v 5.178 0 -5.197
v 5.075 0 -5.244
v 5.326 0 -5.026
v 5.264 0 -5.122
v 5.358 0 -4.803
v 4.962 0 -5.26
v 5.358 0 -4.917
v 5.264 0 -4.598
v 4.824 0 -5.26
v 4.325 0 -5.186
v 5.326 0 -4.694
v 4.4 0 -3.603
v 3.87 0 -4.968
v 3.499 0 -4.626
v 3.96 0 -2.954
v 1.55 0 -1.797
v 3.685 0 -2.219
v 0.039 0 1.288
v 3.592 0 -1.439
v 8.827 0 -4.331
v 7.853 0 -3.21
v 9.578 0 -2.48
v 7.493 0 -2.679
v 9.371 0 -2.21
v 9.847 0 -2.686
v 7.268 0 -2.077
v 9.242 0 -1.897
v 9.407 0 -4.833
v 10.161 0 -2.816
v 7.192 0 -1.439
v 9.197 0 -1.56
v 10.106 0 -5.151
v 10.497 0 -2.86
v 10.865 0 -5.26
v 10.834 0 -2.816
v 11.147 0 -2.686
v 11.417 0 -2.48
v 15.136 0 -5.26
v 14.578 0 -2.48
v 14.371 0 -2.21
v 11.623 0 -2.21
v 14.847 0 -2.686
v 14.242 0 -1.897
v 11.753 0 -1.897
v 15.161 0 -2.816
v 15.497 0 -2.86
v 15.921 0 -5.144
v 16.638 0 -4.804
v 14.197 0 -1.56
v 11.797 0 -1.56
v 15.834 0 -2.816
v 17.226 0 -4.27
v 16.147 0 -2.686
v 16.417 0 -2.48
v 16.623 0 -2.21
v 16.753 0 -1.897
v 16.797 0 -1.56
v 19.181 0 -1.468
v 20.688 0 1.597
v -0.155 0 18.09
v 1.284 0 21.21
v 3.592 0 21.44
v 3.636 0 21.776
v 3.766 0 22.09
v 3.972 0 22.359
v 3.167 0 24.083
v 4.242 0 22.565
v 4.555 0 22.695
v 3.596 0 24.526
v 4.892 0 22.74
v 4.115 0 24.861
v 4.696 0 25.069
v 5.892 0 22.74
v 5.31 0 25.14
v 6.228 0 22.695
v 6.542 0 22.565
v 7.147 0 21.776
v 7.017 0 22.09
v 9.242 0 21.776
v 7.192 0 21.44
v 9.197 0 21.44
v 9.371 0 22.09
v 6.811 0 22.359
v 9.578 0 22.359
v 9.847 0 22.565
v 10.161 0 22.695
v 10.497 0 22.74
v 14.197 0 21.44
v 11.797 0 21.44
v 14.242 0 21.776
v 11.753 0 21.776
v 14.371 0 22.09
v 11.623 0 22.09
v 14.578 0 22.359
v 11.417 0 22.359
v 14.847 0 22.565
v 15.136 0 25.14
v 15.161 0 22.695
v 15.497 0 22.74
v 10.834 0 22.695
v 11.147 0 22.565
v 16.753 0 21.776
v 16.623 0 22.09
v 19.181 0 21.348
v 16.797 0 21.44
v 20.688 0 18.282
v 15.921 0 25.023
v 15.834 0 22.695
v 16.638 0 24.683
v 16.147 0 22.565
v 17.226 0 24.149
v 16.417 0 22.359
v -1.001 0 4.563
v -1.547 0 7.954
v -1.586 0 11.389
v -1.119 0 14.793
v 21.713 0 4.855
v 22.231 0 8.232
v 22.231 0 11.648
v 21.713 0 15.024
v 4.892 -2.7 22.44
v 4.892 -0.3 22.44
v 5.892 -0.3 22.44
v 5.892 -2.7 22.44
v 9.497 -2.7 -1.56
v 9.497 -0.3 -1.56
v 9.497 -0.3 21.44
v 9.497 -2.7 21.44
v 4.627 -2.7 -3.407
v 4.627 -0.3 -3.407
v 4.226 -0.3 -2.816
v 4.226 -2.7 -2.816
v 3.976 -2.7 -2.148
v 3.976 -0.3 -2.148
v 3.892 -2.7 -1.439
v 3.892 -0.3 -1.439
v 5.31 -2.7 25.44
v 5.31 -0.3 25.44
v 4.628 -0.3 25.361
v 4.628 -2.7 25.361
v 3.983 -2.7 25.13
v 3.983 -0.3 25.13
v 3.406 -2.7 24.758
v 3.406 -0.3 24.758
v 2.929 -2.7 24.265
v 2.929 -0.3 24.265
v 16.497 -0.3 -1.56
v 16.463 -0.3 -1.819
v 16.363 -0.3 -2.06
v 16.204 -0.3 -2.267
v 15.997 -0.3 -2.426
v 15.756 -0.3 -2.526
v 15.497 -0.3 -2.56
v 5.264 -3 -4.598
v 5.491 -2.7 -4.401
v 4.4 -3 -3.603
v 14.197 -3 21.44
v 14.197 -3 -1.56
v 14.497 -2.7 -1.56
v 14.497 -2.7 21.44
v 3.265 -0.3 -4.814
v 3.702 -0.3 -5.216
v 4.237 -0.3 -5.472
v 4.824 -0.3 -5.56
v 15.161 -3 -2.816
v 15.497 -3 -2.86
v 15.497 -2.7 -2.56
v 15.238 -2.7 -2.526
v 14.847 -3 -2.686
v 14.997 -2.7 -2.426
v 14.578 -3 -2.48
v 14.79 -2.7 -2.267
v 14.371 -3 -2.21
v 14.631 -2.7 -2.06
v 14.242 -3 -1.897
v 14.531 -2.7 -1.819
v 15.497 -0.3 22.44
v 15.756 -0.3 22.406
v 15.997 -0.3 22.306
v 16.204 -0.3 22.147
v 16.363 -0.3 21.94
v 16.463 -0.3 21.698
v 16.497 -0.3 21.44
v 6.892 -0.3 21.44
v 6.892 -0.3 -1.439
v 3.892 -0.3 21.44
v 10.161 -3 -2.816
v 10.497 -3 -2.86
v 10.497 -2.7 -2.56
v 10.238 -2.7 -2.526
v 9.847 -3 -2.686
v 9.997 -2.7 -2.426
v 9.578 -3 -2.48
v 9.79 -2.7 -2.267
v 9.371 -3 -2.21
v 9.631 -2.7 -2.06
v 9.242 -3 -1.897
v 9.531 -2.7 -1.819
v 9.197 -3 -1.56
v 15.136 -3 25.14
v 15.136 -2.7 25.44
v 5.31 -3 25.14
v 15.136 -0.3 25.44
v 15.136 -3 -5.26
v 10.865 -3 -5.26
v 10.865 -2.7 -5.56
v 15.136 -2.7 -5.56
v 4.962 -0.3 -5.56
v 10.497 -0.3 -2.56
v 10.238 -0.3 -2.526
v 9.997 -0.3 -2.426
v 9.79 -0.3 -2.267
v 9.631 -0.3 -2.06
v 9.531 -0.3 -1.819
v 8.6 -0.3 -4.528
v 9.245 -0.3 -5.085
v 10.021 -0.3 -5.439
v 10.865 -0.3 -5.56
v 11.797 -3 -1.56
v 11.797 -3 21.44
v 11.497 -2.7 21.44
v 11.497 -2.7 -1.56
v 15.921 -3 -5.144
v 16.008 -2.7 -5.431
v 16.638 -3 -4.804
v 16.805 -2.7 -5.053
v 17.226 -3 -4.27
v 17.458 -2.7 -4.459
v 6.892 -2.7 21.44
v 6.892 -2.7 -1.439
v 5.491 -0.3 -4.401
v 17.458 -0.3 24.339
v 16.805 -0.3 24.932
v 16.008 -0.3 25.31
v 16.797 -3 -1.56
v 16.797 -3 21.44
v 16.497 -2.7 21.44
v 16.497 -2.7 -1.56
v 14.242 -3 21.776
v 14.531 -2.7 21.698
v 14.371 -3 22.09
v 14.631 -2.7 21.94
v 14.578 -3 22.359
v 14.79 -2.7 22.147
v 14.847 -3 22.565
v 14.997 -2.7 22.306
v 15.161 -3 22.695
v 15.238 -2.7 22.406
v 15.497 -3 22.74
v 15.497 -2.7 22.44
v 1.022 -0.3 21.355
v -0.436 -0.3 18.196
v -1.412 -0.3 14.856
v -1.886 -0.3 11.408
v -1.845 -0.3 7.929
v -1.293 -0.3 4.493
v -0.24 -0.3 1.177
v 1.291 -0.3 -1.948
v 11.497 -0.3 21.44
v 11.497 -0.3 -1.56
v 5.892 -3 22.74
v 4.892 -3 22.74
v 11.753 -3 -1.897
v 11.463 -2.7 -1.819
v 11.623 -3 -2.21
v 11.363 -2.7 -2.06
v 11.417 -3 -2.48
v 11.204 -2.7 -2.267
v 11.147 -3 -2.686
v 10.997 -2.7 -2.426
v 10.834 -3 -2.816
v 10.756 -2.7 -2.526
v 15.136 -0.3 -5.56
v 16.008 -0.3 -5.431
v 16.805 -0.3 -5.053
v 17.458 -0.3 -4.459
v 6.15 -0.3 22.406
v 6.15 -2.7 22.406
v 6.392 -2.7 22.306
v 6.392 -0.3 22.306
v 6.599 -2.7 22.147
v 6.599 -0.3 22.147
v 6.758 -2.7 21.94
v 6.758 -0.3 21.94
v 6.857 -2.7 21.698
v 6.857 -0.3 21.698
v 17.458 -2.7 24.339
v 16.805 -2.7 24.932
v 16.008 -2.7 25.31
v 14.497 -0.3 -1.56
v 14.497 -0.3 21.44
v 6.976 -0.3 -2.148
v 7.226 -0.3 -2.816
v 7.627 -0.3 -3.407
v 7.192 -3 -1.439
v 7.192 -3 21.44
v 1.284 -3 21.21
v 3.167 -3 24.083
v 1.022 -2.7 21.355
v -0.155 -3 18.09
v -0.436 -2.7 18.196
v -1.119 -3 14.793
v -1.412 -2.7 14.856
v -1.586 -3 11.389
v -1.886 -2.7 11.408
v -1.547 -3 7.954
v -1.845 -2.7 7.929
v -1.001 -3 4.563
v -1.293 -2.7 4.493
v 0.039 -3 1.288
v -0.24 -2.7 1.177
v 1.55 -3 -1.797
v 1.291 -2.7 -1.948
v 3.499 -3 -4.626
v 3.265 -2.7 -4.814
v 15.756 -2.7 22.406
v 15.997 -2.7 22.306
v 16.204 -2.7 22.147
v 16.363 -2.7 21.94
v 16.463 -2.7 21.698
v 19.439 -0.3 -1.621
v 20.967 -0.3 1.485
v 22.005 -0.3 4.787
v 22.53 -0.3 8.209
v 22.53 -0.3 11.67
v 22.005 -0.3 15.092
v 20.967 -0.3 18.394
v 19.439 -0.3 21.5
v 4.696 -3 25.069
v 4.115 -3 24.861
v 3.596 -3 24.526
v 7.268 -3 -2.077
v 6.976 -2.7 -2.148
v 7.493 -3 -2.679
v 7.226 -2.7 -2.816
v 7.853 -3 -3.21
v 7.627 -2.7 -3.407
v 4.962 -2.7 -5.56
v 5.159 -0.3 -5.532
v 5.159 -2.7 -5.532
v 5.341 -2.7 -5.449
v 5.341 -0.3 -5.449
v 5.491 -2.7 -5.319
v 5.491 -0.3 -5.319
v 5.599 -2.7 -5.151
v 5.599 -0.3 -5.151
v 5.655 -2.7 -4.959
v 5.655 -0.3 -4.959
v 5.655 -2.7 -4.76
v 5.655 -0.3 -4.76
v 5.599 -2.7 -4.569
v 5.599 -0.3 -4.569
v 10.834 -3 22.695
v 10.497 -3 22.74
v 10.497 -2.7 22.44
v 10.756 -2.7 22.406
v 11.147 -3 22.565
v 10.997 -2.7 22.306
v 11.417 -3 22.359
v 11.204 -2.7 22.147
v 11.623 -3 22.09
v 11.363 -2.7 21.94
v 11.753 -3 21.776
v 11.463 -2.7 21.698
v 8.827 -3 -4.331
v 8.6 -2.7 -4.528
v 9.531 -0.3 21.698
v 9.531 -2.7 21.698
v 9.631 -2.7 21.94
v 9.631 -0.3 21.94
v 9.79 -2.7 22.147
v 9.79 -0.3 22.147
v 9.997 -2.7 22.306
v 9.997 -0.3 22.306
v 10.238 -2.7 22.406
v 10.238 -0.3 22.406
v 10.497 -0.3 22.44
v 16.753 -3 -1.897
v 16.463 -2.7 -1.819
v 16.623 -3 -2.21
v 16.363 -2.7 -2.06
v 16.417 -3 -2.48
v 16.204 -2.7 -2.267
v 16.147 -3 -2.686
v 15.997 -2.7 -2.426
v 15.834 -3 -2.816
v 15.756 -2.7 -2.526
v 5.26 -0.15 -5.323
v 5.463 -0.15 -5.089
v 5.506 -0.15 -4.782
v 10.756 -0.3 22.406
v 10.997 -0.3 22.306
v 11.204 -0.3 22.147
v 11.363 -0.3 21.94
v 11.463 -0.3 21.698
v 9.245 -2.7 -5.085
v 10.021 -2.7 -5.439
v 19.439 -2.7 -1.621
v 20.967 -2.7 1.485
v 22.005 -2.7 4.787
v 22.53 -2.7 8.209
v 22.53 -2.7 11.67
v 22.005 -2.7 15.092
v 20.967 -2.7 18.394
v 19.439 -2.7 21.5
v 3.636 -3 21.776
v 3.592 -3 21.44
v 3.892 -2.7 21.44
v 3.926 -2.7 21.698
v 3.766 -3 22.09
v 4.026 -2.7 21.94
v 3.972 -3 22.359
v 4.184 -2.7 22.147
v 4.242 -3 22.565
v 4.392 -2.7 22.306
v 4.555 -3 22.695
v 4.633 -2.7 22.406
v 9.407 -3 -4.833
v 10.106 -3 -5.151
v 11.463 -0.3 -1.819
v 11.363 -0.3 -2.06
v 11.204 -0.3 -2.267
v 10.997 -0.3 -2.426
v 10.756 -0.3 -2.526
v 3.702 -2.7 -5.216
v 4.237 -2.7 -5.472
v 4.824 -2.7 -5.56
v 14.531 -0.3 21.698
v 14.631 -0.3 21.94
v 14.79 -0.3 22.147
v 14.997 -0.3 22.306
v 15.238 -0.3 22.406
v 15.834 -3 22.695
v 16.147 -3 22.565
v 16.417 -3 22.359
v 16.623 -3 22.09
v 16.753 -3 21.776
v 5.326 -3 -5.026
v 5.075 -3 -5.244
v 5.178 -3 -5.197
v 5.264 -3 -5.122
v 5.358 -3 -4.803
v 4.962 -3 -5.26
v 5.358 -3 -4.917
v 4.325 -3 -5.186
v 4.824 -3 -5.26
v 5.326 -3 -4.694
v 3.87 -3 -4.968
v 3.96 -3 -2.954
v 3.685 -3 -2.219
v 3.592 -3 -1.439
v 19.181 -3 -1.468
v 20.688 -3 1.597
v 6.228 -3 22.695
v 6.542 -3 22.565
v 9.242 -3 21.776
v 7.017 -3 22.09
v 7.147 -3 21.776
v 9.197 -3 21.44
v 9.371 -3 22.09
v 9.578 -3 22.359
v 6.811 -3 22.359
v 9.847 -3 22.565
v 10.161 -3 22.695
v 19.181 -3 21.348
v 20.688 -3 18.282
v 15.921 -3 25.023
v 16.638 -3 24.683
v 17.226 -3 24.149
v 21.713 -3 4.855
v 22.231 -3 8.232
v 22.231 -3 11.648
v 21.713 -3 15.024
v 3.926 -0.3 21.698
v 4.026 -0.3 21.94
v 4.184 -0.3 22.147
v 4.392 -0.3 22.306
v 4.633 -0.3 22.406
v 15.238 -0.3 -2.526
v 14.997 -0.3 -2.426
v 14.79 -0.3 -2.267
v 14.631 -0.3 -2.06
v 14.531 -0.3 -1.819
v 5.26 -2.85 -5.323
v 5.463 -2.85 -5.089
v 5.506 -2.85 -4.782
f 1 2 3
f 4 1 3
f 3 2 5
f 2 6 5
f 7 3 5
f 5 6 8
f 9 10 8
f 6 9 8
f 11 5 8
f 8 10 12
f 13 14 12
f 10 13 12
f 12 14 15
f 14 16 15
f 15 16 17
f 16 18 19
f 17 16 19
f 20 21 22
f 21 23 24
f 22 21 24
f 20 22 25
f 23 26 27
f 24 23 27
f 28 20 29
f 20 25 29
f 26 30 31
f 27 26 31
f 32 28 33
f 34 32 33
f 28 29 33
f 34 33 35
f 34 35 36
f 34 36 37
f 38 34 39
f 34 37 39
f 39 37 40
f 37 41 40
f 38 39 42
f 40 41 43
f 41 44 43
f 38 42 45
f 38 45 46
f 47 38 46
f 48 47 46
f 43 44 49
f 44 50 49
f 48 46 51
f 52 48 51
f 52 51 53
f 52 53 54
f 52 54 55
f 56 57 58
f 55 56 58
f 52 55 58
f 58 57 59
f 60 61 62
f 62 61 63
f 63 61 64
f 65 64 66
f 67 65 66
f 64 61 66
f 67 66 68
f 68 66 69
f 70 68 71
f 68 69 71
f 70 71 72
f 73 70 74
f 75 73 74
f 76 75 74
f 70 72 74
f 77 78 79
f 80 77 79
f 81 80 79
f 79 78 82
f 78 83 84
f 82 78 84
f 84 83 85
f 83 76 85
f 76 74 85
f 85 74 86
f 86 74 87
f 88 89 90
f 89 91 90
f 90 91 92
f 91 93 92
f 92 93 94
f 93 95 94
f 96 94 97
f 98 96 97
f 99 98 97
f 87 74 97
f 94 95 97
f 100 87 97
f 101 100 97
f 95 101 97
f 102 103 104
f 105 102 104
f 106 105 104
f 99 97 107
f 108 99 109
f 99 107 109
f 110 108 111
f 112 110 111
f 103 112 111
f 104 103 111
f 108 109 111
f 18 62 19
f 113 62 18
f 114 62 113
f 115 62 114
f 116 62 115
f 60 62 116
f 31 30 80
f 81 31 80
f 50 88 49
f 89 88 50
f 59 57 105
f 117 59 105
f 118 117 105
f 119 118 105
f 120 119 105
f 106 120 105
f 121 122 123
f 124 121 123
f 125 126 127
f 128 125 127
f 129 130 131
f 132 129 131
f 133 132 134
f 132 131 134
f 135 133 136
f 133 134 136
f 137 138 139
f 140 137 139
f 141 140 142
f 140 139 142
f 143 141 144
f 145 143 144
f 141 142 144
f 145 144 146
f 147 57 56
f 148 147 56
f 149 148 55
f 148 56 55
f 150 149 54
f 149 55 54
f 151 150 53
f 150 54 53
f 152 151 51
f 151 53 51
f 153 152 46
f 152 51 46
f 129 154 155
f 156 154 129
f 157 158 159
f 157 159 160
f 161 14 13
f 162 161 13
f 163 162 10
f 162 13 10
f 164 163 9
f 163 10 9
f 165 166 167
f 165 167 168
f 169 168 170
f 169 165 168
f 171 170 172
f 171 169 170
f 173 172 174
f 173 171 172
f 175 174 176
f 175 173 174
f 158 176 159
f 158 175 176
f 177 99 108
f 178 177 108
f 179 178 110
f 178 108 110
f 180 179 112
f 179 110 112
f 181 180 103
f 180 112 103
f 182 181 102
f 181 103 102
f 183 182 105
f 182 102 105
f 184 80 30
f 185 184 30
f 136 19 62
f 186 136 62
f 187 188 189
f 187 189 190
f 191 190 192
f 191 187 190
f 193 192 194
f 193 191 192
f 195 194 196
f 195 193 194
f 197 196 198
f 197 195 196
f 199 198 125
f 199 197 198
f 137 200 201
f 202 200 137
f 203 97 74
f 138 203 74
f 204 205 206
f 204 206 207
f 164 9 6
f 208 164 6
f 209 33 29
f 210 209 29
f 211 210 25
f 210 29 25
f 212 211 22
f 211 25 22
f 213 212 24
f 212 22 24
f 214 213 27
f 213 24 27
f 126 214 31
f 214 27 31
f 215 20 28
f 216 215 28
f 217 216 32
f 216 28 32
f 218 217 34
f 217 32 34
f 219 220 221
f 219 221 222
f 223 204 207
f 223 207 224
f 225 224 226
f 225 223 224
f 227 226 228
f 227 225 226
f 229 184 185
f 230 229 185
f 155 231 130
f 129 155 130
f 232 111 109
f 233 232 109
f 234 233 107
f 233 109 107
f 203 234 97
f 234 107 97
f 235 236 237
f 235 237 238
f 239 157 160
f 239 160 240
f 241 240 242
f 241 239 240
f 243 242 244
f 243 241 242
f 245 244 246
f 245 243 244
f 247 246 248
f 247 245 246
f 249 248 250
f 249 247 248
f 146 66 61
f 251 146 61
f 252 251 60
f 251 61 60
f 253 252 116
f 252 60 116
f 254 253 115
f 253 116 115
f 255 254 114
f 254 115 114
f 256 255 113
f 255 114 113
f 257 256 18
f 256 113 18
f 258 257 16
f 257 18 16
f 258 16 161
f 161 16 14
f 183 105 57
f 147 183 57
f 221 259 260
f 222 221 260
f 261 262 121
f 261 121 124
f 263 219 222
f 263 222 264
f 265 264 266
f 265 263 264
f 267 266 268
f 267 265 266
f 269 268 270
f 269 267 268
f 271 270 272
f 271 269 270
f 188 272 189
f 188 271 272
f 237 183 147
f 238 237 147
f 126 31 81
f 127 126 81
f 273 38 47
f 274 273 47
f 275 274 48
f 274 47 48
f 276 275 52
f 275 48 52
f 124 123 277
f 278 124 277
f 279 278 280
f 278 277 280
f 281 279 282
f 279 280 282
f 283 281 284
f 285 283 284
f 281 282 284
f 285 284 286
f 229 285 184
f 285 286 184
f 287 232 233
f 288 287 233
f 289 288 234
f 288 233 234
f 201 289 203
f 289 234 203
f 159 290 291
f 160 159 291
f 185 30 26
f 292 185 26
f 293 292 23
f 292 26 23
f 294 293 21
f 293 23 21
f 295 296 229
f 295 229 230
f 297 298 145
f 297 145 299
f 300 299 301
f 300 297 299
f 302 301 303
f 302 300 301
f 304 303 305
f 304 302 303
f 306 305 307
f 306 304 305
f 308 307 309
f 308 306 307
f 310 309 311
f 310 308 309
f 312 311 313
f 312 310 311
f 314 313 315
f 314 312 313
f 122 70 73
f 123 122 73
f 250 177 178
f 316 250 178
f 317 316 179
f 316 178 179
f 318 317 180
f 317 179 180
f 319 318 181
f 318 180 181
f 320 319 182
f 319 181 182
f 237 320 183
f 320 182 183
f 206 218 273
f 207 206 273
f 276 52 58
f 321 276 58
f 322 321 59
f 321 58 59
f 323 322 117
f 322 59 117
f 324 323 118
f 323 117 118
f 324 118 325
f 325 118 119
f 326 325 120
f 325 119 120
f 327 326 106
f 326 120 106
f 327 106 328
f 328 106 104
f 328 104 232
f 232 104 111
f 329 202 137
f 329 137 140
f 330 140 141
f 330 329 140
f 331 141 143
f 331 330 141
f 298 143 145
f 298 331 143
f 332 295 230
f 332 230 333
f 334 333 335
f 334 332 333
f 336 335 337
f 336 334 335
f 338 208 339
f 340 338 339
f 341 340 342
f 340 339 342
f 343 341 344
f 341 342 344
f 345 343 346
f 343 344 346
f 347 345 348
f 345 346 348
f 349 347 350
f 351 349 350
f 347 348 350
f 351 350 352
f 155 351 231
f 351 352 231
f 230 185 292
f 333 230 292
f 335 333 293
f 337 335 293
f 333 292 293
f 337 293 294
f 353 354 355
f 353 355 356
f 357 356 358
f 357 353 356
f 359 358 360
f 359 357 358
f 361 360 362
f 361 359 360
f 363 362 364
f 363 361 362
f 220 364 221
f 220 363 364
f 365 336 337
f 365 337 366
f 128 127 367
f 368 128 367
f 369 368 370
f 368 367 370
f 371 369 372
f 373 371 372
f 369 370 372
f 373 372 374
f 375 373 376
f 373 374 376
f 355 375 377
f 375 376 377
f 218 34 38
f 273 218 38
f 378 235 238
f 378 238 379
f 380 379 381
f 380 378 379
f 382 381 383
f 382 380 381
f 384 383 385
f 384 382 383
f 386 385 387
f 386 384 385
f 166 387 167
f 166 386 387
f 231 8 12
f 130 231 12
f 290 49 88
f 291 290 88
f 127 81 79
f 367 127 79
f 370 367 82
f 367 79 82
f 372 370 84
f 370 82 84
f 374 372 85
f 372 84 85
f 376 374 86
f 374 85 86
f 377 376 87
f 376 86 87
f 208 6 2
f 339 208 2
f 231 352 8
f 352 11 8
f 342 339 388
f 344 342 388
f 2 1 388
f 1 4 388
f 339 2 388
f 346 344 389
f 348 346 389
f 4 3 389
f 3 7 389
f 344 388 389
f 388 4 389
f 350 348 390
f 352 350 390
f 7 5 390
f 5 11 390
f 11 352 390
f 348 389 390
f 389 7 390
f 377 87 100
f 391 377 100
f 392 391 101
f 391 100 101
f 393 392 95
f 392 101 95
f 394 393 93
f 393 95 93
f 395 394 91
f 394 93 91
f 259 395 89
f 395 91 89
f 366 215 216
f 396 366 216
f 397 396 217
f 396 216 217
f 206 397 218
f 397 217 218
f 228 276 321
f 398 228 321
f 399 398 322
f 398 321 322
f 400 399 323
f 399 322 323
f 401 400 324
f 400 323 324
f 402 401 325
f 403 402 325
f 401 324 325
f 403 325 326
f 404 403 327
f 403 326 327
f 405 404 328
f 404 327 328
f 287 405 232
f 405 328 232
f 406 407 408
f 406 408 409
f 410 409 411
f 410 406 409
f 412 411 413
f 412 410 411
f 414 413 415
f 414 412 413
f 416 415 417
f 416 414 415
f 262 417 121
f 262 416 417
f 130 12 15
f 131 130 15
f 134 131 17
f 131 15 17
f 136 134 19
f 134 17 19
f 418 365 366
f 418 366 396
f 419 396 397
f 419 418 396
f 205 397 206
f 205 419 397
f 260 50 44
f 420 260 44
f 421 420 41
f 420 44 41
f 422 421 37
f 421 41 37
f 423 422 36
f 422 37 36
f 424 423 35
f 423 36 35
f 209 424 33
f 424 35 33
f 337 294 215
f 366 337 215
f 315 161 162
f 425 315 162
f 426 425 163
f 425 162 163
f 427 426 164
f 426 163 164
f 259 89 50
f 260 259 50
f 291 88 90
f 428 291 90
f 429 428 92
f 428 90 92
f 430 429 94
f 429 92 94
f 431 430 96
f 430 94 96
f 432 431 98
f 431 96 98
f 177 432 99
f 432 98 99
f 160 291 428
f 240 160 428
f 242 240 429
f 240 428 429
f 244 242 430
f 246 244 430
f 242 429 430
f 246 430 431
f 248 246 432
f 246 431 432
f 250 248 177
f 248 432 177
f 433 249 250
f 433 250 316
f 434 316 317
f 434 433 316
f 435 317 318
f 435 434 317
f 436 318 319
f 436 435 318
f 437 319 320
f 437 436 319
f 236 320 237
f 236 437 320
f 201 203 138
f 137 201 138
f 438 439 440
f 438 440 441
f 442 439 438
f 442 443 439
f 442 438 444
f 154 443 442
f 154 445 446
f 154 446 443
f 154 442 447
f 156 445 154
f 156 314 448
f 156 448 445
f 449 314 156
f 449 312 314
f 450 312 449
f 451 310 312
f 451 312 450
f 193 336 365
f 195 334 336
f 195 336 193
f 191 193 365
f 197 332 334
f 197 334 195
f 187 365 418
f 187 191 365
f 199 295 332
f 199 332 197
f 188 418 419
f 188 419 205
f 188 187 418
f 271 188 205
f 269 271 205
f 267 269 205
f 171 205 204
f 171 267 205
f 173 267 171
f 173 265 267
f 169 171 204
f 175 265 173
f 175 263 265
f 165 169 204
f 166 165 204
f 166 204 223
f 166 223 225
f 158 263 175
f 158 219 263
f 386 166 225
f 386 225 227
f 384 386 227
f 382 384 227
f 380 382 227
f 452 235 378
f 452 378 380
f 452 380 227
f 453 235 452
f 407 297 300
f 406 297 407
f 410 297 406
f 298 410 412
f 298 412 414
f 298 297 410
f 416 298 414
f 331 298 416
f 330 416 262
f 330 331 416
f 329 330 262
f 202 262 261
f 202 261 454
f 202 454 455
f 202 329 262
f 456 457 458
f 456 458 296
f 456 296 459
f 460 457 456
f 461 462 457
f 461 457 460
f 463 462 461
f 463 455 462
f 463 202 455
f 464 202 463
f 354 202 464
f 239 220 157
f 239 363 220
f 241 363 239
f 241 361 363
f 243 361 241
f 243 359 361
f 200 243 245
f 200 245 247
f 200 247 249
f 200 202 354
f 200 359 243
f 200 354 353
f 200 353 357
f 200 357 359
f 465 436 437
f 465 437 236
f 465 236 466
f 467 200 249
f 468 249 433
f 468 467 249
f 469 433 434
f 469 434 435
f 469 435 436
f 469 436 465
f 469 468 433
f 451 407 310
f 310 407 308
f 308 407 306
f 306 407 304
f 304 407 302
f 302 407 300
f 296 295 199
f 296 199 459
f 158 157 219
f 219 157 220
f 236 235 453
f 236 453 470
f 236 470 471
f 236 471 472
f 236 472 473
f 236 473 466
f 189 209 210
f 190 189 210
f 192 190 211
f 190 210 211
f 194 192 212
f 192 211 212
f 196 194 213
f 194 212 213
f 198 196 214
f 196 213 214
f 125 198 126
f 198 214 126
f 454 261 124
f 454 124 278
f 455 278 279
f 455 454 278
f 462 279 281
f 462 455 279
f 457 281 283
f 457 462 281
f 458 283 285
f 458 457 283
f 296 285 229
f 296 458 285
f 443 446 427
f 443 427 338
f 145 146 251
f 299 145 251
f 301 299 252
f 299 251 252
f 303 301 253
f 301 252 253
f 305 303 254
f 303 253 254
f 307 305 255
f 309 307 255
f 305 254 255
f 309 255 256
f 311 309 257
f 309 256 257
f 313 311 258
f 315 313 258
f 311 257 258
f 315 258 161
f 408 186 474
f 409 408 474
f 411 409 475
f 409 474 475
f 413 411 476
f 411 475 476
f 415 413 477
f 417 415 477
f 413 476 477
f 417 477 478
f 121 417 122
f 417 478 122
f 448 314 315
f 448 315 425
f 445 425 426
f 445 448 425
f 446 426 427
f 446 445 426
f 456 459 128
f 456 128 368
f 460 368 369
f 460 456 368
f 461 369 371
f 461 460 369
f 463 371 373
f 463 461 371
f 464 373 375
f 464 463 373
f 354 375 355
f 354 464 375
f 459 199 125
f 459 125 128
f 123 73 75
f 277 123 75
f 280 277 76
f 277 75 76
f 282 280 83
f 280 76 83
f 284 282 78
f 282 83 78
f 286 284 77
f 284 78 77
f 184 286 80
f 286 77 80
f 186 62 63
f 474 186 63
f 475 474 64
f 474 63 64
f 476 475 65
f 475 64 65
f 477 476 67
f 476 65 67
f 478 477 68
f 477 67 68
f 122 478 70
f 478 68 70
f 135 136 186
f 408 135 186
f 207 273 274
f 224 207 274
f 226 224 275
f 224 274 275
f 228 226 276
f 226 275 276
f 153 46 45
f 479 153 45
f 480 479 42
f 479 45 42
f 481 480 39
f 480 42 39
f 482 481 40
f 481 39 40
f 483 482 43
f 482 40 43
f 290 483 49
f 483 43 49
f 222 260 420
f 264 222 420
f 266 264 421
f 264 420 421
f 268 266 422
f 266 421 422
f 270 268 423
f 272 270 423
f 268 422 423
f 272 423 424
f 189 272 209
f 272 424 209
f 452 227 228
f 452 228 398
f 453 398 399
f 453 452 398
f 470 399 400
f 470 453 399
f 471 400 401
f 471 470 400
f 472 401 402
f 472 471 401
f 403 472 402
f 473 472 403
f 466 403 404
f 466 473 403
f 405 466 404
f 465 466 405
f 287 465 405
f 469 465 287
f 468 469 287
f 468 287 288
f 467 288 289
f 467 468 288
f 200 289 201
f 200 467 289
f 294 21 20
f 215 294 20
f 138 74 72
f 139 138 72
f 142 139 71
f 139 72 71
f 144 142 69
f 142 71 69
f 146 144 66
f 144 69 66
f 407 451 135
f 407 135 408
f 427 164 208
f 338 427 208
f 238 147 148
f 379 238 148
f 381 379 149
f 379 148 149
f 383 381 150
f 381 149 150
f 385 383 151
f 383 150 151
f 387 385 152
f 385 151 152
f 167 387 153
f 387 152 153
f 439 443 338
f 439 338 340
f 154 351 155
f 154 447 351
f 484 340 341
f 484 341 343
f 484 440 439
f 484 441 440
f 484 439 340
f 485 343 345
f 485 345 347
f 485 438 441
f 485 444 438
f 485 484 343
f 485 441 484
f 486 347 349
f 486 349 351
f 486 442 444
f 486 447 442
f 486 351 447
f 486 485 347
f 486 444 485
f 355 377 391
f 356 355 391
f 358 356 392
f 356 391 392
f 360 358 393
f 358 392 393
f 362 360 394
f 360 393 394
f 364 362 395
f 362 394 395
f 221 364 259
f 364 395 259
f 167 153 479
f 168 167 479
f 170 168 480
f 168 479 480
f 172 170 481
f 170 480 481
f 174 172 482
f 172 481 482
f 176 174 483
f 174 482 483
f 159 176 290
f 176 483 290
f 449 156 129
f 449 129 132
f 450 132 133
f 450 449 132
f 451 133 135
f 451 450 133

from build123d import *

# Parameters (mm, degrees)
F1_DEPTH = 3
F2_SIZE  = 0.3


with BuildPart() as f1:
    # F0 (on Front) → F1 (new body)
    with BuildSketch(Plane.XZ):
        with BuildLine():
            ThreePointArc((8.6002542206, -4.5276246292), (9.6205467371, -5.289994744), (10.8651777768, -5.5603622459))
            Line((10.8651777768, -5.5603622459), (15.1357887981, -5.5603622459))
            ThreePointArc((15.1357887981, -5.5603622459), (16.4208285671, -5.2712058032), (17.4581499839, -4.4594774406))
            ThreePointArc((17.4581499839, -4.4594774406), (22.5960159615, 9.9396377541), (17.4581499839, 24.3387529488))
            ThreePointArc((17.4581499839, 24.3387529488), (16.4208285671, 25.1504813114), (15.1357887981, 25.4396377541))
            Line((15.1357887981, 25.4396377541), (9.4972672168, 25.4396377541))
            Line((9.4972672168, 25.4396377541), (5.3097819548, 25.4396377541))
            ThreePointArc((5.3097819548, 25.4396377541), (3.9825453513, 25.1300732205), (2.9292190014, 24.2652664198))
            ThreePointArc((2.9292190014, 24.2652664198), (-1.9299052308, 9.6676498918), (3.2652167583, -4.8137935487))
            ThreePointArc((3.2652167583, -4.8137935487), (3.9596707492, -5.3640893047), (4.8237128183, -5.5603622459))
            Line((4.8237128183, -5.5603622459), (4.9620791267, -5.5603622459))
            ThreePointArc((4.9620791267, -5.5603622459), (5.5989933763, -5.1507761552), (5.4905612898, -4.4013343565))
            Line((5.4905612898, -4.4013343565), (4.6266101762, -3.4066611267))
            ThreePointArc((4.6266101762, -3.4066611267), (4.0813050346, -2.4894533447), (3.8915337324, -1.4393987434))
            Line((3.8915337324, -1.4393987434), (3.8915337324, 21.4396377541))
            ThreePointArc((3.8915337324, 21.4396377541), (4.1844269512, 22.1467445353), (4.8915337324, 22.4396377541))
            Line((4.8915337324, 22.4396377541), (5.8915337324, 22.4396377541))
            ThreePointArc((5.8915337324, 22.4396377541), (6.5986405136, 22.1467445353), (6.8915337324, 21.4396377541))
            Line((6.8915337324, 21.4396377541), (6.8915337324, -1.4393987434))
            ThreePointArc((6.8915337324, -1.4393987434), (7.0813050346, -2.4894533447), (7.6266101762, -3.4066611267))
            Line((7.6266101762, -3.4066611267), (8.6002542206, -4.5276246292))
        make_face()
        with BuildLine():
            ThreePointArc((10.4972672168, 22.4396377541), (11.204373998, 22.1467445353), (11.4972672168, 21.4396377541))
            Line((11.4972672168, 21.4396377541), (11.4972672168, -1.5603622459))
            ThreePointArc((11.4972672168, -1.5603622459), (11.204373998, -2.2674690271), (10.4972672168, -2.5603622459))
            ThreePointArc((10.4972672168, -2.5603622459), (9.7901604356, -2.2674690271), (9.4972672168, -1.5603622459))
            Line((9.4972672168, -1.5603622459), (9.4972672168, 21.4396377541))
            ThreePointArc((9.4972672168, 21.4396377541), (9.7901604356, 22.1467445353), (10.4972672168, 22.4396377541))
        make_face(mode=Mode.SUBTRACT)
        with BuildLine():
            Line((14.4972672168, -1.5603622459), (14.4972672168, 21.4396377541))
            ThreePointArc((14.4972672168, 21.4396377541), (14.7901604356, 22.1467445353), (15.4972672168, 22.4396377541))
            ThreePointArc((15.4972672168, 22.4396377541), (16.204373998, 22.1467445353), (16.4972672168, 21.4396377541))
            Line((16.4972672168, 21.4396377541), (16.4972672168, -1.5603622459))
            ThreePointArc((16.4972672168, -1.5603622459), (16.204373998, -2.2674690271), (15.4972672168, -2.5603622459))
            ThreePointArc((15.4972672168, -2.5603622459), (14.7901604356, -2.2674690271), (14.4972672168, -1.5603622459))
        make_face(mode=Mode.SUBTRACT)
    extrude(amount=F1_DEPTH)

    # F2
    f2_edges = [f1.edges().sort_by_distance(p)[0] for p in [
        (4.081305, -3, -2.489453),
        (3.891534, -3, 10.00012),
        (4.184427, -3, 22.146745),
        (5.391534, -3, 22.439638),
        (6.598641, -3, 22.146745),
        (6.891534, -3, 10.00012),
        (7.081305, -3, -2.489453),
        (8.113432, -3, -3.967143),
        (9.620547, -3, -5.289995),
        (13.000483, -3, -5.560362),
        (16.420829, -3, -5.271206),
        (22.596016, -3, 9.939638),
        (16.420829, -3, 25.150481),
        (10.222785, -3, 25.439638),
        (3.982545, -3, 25.130073),
        (-1.929905, -3, 9.66765),
        (3.959671, -3, -5.364089),
        (4.892896, -3, -5.560362),
        (5.598993, -3, -5.150776),
        (5.058586, -3, -3.903998),
        (10.497267, -3, 22.439638),
        (11.497267, -3, 9.939638),
        (10.497267, -3, -2.560362),
        (9.497267, -3, 9.939638),
        (15.497267, -3, -2.560362),
        (14.497267, -3, 9.939638),
        (15.497267, -3, 22.439638),
        (16.497267, -3, 9.939638),
        (4.081305, 0, -2.489453),
        (3.891534, 0, 10.00012),
        (4.184427, 0, 22.146745),
        (5.391534, 0, 22.439638),
        (6.598641, 0, 22.146745),
        (6.891534, 0, 10.00012),
        (7.081305, 0, -2.489453),
        (8.113432, 0, -3.967143),
        (9.620547, 0, -5.289995),
        (13.000483, 0, -5.560362),
        (16.420829, 0, -5.271206),
        (22.596016, 0, 9.939638),
        (16.420829, 0, 25.150481),
        (10.222785, 0, 25.439638),
        (3.982545, 0, 25.130073),
        (-1.929905, 0, 9.66765),
        (3.959671, 0, -5.364089),
        (4.892896, 0, -5.560362),
        (5.598993, 0, -5.150776),
        (5.058586, 0, -3.903998),
        (10.497267, 0, 22.439638),
        (11.497267, 0, 9.939638),
        (10.497267, 0, -2.560362),
        (9.497267, 0, 9.939638),
        (15.497267, 0, -2.560362),
        (14.497267, 0, 9.939638),
        (15.497267, 0, 22.439638),
        (16.497267, 0, 9.939638),
    ]]
    chamfer(f2_edges, length=F2_SIZE)


solid = f1.part
